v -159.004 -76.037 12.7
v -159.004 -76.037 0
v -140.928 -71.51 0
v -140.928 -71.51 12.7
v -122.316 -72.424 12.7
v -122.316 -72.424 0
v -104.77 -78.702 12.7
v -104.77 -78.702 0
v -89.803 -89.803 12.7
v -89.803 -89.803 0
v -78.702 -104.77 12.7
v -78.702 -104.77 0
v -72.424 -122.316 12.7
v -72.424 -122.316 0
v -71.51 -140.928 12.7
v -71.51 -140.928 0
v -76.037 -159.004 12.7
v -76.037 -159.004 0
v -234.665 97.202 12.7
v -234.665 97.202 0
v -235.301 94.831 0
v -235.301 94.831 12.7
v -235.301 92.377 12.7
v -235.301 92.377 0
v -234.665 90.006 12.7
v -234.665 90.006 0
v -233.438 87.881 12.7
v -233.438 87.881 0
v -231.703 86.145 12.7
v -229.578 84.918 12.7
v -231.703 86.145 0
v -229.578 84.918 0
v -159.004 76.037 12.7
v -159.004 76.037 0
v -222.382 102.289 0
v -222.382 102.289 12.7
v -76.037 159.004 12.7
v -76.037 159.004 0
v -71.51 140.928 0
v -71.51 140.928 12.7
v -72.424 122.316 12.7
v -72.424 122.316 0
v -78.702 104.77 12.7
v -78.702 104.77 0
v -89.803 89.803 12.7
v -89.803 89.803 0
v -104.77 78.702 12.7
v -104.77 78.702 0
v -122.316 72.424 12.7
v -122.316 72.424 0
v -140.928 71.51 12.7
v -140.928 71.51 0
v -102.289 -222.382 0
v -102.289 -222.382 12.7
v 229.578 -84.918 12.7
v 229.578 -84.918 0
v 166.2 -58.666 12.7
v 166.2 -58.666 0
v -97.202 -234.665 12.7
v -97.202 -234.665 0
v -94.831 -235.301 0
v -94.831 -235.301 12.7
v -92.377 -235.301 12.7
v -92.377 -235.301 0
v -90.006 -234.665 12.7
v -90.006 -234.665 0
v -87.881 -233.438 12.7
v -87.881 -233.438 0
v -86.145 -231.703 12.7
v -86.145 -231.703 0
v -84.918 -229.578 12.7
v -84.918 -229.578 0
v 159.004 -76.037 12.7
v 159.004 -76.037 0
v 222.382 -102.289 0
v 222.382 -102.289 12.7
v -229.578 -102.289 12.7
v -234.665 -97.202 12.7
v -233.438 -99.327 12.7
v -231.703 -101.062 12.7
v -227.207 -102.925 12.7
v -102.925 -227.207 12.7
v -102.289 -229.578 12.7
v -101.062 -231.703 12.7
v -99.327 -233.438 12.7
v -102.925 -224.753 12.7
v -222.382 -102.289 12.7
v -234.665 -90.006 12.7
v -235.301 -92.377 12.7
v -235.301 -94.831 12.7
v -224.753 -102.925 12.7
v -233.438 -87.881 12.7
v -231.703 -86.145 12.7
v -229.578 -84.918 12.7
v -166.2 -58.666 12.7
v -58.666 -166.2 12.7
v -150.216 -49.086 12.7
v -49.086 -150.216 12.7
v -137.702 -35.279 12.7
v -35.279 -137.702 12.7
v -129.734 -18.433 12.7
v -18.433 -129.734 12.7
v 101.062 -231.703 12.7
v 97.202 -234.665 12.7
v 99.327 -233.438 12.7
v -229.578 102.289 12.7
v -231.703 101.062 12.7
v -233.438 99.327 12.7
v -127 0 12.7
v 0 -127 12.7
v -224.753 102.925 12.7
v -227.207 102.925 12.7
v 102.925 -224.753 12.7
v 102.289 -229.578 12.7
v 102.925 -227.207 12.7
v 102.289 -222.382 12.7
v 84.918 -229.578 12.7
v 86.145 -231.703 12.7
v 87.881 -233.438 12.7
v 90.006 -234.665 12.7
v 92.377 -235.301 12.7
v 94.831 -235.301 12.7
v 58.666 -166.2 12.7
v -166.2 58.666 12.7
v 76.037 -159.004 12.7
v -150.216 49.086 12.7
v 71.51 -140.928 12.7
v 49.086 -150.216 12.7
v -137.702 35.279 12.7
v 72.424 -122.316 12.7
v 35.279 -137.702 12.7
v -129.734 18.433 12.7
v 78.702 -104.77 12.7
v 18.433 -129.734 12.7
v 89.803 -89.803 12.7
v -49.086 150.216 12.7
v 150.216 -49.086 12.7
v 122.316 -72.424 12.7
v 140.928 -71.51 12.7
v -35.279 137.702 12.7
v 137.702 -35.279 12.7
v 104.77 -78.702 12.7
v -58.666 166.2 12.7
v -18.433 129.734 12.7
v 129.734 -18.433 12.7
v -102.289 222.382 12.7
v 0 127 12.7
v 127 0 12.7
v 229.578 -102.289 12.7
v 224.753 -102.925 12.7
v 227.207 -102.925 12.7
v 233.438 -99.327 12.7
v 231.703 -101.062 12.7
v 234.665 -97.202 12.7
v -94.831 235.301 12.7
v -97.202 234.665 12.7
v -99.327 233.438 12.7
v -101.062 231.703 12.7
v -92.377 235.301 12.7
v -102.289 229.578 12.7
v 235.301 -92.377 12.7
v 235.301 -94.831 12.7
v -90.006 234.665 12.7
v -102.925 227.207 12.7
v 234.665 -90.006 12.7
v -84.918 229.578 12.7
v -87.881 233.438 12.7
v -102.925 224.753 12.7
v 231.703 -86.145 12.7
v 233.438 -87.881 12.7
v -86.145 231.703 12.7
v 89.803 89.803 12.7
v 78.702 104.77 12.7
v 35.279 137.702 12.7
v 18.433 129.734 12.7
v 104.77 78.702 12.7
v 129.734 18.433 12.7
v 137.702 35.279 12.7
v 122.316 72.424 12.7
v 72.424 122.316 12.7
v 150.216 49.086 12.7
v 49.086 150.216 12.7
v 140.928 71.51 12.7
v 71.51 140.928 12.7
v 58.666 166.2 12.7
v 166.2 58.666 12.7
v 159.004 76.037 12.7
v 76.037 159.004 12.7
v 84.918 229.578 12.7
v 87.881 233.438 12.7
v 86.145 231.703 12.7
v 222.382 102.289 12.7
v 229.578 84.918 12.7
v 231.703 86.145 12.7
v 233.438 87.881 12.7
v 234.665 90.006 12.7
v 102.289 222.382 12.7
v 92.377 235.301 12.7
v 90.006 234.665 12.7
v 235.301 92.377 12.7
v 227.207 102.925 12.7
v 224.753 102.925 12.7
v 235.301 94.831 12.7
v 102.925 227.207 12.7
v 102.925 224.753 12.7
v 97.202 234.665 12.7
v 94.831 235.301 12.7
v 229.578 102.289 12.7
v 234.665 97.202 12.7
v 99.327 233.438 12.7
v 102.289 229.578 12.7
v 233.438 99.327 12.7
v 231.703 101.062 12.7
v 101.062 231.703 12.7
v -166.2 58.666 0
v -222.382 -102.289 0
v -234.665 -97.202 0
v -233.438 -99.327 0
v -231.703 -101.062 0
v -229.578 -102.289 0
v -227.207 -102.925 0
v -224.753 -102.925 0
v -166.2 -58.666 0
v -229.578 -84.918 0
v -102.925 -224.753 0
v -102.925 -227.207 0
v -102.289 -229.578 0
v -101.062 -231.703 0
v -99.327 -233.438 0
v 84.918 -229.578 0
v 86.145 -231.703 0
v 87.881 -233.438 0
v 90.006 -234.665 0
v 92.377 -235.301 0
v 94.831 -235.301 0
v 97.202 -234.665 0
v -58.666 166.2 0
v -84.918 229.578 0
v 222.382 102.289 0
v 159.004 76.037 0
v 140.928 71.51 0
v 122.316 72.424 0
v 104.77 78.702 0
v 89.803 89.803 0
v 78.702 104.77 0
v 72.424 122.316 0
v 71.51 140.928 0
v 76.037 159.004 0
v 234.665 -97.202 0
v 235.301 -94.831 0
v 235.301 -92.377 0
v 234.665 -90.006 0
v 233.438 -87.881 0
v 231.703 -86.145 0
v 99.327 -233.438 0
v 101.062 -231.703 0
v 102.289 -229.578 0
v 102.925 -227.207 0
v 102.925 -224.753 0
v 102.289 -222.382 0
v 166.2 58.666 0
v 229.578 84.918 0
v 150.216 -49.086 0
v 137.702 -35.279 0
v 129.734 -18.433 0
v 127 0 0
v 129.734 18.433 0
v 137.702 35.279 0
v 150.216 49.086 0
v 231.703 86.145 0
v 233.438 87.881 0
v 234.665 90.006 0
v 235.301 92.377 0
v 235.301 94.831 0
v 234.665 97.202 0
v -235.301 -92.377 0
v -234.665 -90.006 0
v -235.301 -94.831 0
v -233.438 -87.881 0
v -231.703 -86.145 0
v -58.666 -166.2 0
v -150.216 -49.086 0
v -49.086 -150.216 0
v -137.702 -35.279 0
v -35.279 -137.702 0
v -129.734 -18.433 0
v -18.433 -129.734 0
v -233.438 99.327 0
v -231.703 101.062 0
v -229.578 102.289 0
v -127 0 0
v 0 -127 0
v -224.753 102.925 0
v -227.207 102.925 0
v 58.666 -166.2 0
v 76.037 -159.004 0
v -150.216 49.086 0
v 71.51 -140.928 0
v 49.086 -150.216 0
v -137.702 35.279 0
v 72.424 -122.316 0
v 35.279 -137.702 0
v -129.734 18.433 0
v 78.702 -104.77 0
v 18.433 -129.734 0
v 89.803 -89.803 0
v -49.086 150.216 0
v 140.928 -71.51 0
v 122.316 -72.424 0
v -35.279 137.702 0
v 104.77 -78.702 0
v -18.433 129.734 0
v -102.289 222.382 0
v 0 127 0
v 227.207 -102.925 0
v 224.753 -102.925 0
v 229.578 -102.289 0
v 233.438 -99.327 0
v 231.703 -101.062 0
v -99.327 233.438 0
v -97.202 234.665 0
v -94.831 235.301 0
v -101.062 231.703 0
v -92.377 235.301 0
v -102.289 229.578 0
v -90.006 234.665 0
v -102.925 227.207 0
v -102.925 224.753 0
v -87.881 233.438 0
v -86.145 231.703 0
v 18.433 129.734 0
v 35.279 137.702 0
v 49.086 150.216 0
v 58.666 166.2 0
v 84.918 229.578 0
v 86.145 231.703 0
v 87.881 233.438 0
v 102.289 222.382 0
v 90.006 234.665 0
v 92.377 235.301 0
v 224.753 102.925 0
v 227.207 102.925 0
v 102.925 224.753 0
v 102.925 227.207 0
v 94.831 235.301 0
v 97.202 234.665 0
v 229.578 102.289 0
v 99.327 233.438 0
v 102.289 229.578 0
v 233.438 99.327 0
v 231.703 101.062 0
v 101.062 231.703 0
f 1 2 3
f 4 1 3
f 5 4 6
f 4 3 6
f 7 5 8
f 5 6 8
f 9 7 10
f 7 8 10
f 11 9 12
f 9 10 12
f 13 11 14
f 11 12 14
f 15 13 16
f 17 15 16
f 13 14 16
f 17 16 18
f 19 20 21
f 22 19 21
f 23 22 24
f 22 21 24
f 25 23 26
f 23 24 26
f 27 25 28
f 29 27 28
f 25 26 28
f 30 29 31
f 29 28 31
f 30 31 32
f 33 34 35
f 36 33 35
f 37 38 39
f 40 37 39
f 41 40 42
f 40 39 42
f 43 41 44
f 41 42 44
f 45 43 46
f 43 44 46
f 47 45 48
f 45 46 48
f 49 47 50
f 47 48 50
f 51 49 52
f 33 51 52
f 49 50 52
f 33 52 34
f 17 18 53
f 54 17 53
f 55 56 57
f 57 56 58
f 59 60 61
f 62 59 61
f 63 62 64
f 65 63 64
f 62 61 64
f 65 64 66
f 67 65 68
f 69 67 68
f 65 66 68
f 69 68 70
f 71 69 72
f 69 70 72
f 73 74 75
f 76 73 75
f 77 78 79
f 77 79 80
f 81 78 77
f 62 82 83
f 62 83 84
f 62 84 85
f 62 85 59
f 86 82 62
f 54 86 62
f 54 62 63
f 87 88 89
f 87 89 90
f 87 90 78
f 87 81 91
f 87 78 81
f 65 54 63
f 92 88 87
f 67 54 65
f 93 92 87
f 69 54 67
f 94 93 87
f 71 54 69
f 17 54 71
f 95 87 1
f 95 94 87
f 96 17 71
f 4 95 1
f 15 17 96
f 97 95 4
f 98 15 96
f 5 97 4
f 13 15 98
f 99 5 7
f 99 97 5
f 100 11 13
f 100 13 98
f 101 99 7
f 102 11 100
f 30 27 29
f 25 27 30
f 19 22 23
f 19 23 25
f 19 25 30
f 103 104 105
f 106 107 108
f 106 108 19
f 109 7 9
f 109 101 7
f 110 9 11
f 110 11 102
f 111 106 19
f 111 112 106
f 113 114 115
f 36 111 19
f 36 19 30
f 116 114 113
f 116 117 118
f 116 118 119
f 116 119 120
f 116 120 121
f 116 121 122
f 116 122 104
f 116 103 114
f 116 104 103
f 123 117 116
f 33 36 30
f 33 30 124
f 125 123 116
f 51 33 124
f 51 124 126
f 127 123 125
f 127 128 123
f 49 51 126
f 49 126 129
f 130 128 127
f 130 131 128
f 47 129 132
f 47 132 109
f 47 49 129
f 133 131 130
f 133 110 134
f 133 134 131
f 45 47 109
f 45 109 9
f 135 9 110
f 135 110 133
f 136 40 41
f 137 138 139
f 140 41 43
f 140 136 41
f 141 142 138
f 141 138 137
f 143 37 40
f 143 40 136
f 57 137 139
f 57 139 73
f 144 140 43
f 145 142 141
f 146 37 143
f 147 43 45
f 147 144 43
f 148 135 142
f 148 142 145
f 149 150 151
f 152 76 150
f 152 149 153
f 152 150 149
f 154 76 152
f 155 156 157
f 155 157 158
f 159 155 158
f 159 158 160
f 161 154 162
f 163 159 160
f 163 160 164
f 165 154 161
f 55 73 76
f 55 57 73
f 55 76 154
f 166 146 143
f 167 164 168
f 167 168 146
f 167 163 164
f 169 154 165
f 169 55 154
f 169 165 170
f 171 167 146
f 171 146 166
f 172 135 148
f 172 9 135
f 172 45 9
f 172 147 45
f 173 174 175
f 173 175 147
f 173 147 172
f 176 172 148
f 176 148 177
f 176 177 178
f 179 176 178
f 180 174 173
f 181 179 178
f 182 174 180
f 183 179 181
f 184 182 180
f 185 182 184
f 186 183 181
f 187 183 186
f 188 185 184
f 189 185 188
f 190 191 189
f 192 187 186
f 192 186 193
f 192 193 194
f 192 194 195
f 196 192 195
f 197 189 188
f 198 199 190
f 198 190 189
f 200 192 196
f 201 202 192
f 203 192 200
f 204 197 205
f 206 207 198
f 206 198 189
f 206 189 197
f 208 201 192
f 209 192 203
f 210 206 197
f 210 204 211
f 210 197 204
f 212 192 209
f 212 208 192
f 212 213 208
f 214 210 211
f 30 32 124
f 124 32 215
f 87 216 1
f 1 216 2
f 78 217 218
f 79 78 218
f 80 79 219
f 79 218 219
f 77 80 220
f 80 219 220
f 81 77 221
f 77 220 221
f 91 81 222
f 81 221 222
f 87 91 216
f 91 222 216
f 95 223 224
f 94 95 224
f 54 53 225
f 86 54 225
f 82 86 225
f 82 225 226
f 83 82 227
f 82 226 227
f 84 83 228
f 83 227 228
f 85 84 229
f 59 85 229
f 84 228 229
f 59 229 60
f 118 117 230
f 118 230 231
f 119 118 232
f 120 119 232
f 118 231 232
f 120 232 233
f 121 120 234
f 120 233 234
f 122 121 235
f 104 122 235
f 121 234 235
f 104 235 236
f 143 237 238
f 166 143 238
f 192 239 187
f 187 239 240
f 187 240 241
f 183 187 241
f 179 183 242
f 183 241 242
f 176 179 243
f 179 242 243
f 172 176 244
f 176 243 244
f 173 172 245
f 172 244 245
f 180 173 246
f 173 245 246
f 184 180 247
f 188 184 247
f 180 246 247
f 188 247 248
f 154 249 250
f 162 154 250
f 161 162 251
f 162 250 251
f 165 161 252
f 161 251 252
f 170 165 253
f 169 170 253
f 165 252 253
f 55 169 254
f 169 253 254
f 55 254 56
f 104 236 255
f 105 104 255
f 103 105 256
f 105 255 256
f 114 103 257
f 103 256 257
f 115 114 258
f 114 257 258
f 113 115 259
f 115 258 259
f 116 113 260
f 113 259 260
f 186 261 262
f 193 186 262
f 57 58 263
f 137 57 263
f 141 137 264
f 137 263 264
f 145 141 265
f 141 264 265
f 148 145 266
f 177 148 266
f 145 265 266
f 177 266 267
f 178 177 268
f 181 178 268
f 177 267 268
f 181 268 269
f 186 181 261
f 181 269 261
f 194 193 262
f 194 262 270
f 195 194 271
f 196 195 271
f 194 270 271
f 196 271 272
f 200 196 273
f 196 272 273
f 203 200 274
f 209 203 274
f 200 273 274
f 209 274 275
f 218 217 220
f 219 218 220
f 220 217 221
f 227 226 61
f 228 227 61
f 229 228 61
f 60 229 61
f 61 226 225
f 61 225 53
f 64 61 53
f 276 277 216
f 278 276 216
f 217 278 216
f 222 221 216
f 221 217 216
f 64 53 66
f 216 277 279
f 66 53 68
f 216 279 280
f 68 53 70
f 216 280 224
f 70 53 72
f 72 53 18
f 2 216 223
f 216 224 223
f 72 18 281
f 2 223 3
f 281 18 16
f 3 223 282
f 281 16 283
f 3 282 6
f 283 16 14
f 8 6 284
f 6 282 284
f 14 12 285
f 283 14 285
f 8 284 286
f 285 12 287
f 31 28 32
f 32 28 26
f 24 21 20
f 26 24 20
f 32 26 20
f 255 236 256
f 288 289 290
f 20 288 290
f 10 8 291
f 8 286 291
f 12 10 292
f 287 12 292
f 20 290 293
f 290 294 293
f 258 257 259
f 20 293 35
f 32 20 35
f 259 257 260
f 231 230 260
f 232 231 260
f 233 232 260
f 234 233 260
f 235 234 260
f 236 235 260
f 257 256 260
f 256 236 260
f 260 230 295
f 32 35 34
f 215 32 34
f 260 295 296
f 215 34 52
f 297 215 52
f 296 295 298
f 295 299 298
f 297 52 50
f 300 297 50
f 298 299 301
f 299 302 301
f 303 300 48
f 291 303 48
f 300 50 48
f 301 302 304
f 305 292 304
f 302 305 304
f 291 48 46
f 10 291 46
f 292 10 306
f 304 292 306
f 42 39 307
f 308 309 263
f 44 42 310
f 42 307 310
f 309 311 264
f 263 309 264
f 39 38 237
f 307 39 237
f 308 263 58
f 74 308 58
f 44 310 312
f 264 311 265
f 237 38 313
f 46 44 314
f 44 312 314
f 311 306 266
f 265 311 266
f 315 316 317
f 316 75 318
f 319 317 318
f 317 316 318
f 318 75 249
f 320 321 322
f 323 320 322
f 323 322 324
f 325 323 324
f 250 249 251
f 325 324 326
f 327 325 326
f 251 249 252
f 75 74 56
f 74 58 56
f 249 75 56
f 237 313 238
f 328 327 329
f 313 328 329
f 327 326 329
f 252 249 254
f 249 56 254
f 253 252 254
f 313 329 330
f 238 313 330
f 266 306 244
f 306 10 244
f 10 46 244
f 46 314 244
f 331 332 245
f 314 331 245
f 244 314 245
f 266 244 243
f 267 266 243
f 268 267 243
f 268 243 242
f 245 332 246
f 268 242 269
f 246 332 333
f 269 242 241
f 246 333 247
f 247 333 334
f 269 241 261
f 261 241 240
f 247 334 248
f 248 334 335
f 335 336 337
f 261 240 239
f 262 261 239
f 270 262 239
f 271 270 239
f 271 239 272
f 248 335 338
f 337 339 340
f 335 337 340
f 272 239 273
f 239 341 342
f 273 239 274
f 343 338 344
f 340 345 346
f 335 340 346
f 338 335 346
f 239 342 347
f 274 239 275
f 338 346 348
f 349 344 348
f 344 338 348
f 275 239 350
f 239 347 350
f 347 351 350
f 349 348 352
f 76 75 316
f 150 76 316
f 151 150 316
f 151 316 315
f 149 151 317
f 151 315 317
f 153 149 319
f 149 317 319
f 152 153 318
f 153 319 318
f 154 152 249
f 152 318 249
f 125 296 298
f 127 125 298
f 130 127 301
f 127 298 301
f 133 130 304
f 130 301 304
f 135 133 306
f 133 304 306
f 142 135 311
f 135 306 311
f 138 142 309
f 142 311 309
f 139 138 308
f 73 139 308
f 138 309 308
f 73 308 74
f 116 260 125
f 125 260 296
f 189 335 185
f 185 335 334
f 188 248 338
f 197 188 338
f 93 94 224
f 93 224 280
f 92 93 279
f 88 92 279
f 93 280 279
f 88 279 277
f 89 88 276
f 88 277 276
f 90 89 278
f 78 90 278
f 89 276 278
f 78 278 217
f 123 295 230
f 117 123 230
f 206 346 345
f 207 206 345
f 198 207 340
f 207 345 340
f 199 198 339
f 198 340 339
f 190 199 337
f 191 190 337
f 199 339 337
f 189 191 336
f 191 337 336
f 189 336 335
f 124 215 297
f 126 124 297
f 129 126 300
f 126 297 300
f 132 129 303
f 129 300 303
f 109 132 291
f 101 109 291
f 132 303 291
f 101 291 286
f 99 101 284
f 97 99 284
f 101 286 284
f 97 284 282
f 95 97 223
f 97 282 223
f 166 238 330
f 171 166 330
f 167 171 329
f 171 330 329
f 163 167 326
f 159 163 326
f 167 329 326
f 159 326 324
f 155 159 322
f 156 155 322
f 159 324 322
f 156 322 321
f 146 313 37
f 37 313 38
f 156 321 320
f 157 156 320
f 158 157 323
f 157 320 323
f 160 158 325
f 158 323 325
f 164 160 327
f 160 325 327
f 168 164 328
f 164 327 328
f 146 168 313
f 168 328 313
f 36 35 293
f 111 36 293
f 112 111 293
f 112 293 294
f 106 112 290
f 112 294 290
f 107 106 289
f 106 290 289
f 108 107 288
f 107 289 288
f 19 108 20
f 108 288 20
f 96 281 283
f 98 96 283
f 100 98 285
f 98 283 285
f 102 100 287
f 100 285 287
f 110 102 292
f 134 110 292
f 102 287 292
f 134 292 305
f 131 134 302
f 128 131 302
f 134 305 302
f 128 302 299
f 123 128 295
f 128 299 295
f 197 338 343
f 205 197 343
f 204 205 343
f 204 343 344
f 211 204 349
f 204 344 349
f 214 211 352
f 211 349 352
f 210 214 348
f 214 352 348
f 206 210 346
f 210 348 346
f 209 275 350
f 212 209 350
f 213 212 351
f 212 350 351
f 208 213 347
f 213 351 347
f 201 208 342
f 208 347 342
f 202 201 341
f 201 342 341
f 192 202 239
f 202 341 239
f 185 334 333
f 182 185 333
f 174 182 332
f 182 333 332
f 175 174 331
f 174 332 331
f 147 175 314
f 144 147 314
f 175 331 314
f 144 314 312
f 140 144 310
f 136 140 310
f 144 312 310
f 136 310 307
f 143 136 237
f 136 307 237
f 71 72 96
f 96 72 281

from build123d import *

# Parameters (mm, degrees)
F2_DEPTH = 12.7


with BuildPart() as f2:
    # F0 (on Top) → F2 (new body)
    with BuildSketch(Plane.XY):
        with BuildLine():
            ThreePointArc((-229.577515, -84.918341), (-234.665402, -90.006231), (-234.665401, -97.201592))
            ThreePointArc((-234.665401, -97.201592), (-229.577512, -102.289481), (-222.38215, -102.289481))
            Line((-222.38215, -102.289481), (-159.00424, -76.037492))
            ThreePointArc((-159.00424, -76.037492), (-89.802561, -89.802561), (-76.037492, -159.00424))
            Line((-76.037492, -159.00424), (-102.289483, -222.382153))
            ThreePointArc((-102.289483, -222.382153), (-102.289481, -229.577513), (-97.201592, -234.665401))
            ThreePointArc((-97.201592, -234.665401), (-90.00623, -234.665401), (-84.91834, -229.577512))
            Line((-84.91834, -229.577512), (-58.66635, -166.199602))
            ThreePointArc((-58.66635, -166.199602), (0, -127), (58.66635, -166.199602))
            Line((58.66635, -166.199602), (84.918341, -229.577515))
            ThreePointArc((84.918341, -229.577515), (90.006231, -234.665402), (97.201592, -234.665401))
            ThreePointArc((97.201592, -234.665401), (102.289481, -229.577512), (102.289481, -222.38215))
            Line((102.289481, -222.38215), (76.037492, -159.00424))
            ThreePointArc((76.037492, -159.00424), (89.802561, -89.802561), (159.00424, -76.037492))
            Line((159.00424, -76.037492), (222.382153, -102.289483))
            ThreePointArc((222.382153, -102.289483), (229.577514, -102.289481), (234.665401, -97.201591))
            ThreePointArc((234.665401, -97.201591), (234.665401, -90.006229), (229.577512, -84.91834))
            Line((229.577512, -84.91834), (166.199602, -58.66635))
            ThreePointArc((166.199602, -58.66635), (127, 0), (166.199602, 58.66635))
            Line((166.199602, 58.66635), (229.577515, 84.918341))
            ThreePointArc((229.577515, 84.918341), (234.665402, 90.006231), (234.665401, 97.201592))
            ThreePointArc((234.665401, 97.201592), (229.577512, 102.289481), (222.38215, 102.289481))
            Line((222.38215, 102.289481), (159.00424, 76.037492))
            ThreePointArc((159.00424, 76.037492), (89.802561, 89.802561), (76.037492, 159.00424))
            Line((76.037492, 159.00424), (102.289483, 222.382153))
            ThreePointArc((102.289483, 222.382153), (102.289481, 229.577514), (97.201591, 234.665401))
            ThreePointArc((97.201591, 234.665401), (90.006229, 234.665401), (84.91834, 229.577512))
            Line((84.91834, 229.577512), (58.66635, 166.199602))
            ThreePointArc((58.66635, 166.199602), (0, 127), (-58.66635, 166.199602))
            Line((-58.66635, 166.199602), (-84.918341, 229.577515))
            ThreePointArc((-84.918341, 229.577515), (-90.006232, 234.665402), (-97.201593, 234.665401))
            ThreePointArc((-97.201593, 234.665401), (-102.289481, 229.577511), (-102.289481, 222.38215))
            Line((-102.289481, 222.38215), (-76.037492, 159.00424))
            ThreePointArc((-76.037492, 159.00424), (-89.802561, 89.802561), (-159.00424, 76.037492))
            Line((-159.00424, 76.037492), (-222.382153, 102.289483))
            ThreePointArc((-222.382153, 102.289483), (-229.577514, 102.289481), (-234.665401, 97.201591))
            ThreePointArc((-234.665401, 97.201591), (-234.665401, 90.006229), (-229.577512, 84.91834))
            Line((-229.577512, 84.91834), (-166.199602, 58.66635))
            ThreePointArc((-166.199602, 58.66635), (-127, 0), (-166.199602, -58.66635))
            Line((-166.199602, -58.66635), (-229.577515, -84.918341))
        make_face()
    extrude(amount=F2_DEPTH)


solid = f2.part
